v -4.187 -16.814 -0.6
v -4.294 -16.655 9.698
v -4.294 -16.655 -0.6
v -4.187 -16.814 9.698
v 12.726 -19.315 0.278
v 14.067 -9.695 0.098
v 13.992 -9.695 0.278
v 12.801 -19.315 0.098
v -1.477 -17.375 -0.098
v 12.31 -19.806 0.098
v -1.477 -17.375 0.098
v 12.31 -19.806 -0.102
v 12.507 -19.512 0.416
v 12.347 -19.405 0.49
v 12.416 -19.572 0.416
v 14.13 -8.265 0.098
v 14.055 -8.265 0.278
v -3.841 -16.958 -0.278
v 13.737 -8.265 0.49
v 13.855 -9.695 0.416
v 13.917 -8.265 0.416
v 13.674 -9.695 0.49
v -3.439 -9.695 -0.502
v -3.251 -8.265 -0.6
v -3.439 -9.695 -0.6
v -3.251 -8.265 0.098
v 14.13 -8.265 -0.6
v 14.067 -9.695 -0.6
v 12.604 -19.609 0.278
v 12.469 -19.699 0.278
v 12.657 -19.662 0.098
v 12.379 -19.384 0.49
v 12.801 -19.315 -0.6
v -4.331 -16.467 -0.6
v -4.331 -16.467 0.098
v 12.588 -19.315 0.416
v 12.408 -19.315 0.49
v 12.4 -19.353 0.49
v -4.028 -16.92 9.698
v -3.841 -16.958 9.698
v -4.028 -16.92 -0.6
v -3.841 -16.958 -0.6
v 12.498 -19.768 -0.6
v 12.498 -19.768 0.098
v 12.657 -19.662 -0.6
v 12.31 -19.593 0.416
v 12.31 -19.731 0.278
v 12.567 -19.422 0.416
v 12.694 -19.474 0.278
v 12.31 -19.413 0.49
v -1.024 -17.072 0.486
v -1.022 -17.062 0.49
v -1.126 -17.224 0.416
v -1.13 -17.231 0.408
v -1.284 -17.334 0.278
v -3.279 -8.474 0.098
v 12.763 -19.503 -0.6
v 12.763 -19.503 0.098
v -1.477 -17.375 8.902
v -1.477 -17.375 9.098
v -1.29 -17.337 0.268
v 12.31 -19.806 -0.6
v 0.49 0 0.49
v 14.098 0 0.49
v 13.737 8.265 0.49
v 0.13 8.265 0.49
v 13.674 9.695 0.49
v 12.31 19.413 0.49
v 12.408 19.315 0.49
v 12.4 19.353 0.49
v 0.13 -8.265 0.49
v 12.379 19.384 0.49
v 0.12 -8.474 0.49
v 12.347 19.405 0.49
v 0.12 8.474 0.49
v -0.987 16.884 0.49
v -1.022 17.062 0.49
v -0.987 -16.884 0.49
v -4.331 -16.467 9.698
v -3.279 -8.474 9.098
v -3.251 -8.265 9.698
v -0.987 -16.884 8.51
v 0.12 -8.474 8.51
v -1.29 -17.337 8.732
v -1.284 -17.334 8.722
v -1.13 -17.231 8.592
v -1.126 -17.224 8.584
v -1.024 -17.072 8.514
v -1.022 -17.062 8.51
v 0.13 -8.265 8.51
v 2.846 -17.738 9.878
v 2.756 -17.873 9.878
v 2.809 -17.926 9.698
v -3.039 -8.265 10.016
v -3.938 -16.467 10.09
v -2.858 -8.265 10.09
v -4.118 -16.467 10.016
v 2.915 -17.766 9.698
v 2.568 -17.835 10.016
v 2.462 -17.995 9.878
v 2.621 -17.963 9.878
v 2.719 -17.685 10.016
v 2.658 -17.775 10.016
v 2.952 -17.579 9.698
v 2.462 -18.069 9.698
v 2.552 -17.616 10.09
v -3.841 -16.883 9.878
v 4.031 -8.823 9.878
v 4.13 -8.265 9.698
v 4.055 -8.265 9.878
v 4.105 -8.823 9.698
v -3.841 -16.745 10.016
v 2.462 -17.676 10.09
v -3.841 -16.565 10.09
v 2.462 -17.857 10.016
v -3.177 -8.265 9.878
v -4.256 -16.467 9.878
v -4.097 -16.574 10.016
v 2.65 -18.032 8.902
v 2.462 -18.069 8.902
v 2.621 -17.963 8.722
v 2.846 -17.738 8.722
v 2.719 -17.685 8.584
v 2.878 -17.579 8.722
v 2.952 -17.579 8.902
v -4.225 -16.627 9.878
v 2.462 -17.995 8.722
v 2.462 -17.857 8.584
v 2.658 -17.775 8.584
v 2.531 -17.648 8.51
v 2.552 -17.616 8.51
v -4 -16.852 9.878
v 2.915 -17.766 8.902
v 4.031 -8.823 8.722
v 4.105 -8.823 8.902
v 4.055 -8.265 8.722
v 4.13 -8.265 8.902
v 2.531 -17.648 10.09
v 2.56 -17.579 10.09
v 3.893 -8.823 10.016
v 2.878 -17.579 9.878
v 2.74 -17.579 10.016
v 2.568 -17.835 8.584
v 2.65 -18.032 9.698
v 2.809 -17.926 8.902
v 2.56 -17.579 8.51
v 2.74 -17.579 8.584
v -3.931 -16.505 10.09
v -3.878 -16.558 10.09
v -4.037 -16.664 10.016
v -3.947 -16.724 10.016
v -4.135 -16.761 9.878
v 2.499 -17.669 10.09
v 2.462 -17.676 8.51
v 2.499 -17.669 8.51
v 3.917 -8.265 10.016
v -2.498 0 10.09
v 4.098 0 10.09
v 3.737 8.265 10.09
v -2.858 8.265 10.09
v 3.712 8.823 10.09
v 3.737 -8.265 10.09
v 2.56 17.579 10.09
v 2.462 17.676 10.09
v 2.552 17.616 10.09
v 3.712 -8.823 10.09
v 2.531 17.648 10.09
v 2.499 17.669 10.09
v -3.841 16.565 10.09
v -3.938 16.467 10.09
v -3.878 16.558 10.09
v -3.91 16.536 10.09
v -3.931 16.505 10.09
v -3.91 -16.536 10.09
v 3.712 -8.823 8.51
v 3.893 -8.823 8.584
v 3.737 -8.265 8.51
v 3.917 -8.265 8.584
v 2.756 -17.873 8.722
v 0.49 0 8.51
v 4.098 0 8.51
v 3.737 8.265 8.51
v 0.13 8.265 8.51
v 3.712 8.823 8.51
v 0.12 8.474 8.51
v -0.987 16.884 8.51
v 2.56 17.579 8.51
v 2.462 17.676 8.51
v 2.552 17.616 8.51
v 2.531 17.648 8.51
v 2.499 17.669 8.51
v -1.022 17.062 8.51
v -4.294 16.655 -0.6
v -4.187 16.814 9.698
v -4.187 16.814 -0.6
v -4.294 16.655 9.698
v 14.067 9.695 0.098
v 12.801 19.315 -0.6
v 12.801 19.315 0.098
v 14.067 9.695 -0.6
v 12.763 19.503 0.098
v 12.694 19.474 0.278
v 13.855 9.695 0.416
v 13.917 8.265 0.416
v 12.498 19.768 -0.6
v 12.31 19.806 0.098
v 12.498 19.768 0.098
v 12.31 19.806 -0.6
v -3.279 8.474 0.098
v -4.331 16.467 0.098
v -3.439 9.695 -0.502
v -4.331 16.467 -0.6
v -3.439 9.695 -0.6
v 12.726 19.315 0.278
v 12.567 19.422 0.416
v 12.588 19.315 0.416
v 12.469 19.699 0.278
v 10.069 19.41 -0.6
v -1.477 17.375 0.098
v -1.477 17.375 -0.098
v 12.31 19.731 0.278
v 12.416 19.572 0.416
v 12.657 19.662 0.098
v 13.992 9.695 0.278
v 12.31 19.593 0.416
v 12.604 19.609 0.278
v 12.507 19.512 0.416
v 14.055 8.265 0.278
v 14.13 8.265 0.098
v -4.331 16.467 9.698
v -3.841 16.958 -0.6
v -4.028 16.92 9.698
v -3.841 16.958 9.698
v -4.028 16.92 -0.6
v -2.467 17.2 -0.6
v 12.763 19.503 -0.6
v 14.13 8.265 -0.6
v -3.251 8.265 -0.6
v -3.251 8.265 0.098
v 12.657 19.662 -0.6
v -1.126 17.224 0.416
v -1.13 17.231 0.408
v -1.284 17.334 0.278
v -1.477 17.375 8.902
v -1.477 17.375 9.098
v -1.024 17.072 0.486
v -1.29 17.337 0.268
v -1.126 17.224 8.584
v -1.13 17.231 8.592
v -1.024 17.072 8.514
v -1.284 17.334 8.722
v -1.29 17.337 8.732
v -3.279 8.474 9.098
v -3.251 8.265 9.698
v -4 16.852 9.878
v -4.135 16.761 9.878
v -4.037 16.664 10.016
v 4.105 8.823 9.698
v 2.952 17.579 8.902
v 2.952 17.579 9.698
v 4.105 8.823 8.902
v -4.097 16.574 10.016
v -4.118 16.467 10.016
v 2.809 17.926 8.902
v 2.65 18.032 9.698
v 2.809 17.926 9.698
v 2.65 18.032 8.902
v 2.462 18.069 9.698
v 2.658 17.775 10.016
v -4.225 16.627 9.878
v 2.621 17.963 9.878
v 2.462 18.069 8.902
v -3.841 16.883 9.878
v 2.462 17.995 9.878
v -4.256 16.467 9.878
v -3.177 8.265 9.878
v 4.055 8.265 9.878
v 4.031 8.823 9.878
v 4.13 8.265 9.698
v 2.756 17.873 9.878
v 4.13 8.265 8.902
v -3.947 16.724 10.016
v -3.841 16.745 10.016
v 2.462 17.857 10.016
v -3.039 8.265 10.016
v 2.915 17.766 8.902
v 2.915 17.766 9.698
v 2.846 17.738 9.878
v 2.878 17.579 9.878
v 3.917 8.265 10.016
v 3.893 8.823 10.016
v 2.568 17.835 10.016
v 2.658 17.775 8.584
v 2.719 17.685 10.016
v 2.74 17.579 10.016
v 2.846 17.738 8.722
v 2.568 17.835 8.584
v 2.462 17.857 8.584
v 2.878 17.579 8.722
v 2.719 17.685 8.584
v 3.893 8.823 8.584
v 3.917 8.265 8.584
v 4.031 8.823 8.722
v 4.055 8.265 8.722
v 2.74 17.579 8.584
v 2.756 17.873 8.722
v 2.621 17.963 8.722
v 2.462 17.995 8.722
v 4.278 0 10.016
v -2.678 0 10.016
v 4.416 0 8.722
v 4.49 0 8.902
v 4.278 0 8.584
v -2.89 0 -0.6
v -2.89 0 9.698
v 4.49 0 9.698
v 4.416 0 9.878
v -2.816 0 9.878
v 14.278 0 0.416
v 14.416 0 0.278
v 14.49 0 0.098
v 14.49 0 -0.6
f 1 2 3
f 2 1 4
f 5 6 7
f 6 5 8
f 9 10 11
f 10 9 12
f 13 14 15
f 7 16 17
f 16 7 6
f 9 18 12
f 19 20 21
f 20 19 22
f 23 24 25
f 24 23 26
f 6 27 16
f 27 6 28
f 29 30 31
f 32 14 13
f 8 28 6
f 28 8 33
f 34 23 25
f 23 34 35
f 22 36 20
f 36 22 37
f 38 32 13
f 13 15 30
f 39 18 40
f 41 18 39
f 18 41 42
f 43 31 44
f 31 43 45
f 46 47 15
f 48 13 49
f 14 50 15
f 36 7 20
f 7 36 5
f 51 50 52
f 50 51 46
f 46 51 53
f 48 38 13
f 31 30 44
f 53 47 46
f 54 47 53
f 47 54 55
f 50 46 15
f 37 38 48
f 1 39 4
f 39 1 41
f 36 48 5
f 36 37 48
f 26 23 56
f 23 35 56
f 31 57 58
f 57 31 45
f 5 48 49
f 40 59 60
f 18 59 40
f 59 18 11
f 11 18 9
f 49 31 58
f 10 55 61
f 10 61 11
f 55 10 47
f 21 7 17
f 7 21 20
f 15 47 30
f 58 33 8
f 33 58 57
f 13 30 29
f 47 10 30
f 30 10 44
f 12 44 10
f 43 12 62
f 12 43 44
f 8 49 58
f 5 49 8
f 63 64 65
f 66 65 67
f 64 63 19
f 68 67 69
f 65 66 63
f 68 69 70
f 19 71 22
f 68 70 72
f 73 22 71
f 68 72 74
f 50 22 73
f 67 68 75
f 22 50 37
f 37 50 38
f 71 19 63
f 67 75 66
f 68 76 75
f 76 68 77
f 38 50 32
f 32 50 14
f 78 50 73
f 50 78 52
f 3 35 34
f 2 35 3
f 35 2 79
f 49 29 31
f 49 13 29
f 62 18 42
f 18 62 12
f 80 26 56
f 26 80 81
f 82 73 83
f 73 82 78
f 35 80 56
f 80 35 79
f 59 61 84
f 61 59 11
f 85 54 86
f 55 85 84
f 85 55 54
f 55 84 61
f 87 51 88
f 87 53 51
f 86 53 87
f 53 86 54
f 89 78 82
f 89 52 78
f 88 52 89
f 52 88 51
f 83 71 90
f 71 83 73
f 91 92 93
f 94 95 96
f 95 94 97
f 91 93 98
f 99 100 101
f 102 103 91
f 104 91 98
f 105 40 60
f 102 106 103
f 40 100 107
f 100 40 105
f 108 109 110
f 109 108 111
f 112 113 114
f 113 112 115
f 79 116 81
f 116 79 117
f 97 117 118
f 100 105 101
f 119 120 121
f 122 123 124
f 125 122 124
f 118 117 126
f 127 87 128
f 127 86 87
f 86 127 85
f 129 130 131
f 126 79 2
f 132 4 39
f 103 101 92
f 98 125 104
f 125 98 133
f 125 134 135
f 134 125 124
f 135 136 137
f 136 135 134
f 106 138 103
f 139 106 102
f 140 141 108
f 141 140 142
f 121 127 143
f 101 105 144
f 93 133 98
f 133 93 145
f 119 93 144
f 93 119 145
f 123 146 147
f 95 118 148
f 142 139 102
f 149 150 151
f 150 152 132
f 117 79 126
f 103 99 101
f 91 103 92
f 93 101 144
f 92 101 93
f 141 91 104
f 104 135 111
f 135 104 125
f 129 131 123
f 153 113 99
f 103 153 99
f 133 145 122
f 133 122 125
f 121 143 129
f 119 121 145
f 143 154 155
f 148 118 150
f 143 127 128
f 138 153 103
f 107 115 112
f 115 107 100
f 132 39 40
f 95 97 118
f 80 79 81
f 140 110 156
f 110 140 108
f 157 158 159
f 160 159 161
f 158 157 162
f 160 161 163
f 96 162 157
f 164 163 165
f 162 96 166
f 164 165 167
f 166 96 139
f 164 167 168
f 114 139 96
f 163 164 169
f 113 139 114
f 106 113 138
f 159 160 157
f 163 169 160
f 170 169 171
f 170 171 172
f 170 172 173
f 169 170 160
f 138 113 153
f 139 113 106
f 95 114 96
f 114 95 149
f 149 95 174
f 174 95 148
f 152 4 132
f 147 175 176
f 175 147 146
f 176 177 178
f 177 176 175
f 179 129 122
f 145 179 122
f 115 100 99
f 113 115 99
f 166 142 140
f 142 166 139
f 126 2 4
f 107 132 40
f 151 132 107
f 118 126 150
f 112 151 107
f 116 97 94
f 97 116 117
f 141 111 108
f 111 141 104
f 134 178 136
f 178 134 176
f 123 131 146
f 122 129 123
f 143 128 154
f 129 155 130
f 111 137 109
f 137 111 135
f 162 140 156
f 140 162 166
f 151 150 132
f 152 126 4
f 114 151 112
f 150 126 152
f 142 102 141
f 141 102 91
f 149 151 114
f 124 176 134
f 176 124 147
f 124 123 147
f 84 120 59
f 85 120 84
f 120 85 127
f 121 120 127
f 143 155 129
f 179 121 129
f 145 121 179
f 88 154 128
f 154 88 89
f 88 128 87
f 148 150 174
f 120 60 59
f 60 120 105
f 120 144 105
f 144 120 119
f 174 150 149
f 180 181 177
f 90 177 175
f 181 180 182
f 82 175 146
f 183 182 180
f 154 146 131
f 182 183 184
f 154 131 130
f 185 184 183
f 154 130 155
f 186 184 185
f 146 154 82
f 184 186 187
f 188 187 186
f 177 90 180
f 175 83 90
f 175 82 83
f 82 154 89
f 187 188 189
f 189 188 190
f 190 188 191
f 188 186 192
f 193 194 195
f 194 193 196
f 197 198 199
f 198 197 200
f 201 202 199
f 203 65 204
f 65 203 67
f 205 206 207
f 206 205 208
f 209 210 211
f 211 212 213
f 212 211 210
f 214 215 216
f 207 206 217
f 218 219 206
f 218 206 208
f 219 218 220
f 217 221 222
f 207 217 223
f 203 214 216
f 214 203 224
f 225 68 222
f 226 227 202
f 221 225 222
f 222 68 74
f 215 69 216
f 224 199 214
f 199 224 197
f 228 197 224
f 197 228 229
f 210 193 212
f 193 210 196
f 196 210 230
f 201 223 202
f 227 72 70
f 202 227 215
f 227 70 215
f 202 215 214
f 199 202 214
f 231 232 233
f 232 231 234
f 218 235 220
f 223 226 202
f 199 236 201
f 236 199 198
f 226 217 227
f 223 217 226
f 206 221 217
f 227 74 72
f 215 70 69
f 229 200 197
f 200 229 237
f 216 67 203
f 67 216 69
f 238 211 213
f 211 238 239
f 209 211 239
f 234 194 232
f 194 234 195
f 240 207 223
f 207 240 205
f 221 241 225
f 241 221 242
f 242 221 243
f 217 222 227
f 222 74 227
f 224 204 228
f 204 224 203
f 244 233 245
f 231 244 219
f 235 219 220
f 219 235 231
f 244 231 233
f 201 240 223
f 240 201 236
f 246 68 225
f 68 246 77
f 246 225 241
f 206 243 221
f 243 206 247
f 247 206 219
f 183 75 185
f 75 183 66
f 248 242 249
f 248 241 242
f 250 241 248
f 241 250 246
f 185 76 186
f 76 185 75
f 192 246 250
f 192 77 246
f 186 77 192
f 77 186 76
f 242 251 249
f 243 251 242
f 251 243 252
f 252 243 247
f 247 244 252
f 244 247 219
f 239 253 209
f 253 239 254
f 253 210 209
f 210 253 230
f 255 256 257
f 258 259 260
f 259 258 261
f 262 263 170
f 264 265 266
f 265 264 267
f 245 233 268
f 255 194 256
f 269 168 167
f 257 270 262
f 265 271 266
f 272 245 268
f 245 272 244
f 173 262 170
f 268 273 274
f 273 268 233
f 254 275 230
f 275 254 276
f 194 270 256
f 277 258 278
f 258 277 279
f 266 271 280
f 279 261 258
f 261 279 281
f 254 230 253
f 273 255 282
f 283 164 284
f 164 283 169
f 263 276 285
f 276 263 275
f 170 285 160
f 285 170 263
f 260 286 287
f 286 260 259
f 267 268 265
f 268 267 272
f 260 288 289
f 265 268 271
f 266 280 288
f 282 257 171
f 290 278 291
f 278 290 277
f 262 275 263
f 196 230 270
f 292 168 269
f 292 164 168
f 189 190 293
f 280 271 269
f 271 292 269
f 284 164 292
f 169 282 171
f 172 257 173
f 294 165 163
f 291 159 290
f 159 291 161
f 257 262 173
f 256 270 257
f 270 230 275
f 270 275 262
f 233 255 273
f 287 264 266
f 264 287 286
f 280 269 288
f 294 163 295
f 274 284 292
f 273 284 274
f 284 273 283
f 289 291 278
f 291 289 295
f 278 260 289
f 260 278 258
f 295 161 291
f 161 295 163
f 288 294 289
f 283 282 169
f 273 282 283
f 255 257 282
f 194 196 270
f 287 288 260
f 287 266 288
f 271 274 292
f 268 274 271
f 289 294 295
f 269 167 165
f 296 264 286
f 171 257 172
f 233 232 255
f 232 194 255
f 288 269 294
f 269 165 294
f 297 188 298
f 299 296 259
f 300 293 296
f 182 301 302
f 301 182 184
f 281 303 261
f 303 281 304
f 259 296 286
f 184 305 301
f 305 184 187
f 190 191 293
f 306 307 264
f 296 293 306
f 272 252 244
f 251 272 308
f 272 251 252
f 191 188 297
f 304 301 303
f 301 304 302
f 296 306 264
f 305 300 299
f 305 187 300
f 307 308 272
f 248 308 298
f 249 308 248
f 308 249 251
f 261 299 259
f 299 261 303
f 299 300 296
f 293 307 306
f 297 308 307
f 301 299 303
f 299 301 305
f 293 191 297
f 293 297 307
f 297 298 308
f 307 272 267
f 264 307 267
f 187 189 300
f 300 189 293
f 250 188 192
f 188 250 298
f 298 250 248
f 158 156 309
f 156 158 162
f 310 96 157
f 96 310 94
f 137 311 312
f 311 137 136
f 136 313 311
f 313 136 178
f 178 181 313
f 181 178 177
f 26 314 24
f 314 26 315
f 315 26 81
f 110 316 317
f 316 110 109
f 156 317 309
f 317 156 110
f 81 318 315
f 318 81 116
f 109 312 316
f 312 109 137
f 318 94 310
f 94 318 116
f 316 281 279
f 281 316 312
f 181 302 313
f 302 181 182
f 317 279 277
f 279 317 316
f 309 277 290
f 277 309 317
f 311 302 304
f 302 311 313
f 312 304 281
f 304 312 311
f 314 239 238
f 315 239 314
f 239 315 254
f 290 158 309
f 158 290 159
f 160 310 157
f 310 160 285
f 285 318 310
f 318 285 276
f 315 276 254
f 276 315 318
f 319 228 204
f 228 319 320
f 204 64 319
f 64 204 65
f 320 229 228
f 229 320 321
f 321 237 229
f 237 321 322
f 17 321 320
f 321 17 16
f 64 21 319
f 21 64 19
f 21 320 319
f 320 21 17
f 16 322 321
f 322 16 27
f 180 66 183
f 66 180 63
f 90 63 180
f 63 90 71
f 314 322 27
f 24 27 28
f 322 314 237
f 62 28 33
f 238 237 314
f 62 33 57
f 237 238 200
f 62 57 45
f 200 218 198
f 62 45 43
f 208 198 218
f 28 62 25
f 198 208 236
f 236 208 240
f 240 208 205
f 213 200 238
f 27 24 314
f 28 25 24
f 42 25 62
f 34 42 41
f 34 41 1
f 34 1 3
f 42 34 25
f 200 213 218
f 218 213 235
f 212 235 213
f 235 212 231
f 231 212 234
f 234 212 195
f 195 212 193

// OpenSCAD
MD=1;
a=14;
b=4;
s=8+MD;
A=20;
W=1.6-MD;

function    circleSlice2radius(a,b) = (a/2)*(a/2)/(2*b);

mode="preview";
SS=(mode=="def") ? 16 : 4;
r=circleSlice2radius(165,35);
echo(r);


//translate([0,-r,0])
//cylinder($fn=


difference() { 
translate([-r,0,0])
minkowski()
{
rotate(-A/2)
rotate_extrude(angle=A,$fn=A*SS) {
    W0=-2*W;
    translate([r,0])   {
        polygon([
            [2*W0,W0],
            [a,W0/2],
            [a,0],
            [0,0],
            [0,s],
            [b,s],
            [b,s+W],
            [2*W0,s+W],
        
                ]);
    }
}
sphere($fn=16,d=MD);
}

    
    translate([0,0,-100-W])
    cube(200,center=true);
}
